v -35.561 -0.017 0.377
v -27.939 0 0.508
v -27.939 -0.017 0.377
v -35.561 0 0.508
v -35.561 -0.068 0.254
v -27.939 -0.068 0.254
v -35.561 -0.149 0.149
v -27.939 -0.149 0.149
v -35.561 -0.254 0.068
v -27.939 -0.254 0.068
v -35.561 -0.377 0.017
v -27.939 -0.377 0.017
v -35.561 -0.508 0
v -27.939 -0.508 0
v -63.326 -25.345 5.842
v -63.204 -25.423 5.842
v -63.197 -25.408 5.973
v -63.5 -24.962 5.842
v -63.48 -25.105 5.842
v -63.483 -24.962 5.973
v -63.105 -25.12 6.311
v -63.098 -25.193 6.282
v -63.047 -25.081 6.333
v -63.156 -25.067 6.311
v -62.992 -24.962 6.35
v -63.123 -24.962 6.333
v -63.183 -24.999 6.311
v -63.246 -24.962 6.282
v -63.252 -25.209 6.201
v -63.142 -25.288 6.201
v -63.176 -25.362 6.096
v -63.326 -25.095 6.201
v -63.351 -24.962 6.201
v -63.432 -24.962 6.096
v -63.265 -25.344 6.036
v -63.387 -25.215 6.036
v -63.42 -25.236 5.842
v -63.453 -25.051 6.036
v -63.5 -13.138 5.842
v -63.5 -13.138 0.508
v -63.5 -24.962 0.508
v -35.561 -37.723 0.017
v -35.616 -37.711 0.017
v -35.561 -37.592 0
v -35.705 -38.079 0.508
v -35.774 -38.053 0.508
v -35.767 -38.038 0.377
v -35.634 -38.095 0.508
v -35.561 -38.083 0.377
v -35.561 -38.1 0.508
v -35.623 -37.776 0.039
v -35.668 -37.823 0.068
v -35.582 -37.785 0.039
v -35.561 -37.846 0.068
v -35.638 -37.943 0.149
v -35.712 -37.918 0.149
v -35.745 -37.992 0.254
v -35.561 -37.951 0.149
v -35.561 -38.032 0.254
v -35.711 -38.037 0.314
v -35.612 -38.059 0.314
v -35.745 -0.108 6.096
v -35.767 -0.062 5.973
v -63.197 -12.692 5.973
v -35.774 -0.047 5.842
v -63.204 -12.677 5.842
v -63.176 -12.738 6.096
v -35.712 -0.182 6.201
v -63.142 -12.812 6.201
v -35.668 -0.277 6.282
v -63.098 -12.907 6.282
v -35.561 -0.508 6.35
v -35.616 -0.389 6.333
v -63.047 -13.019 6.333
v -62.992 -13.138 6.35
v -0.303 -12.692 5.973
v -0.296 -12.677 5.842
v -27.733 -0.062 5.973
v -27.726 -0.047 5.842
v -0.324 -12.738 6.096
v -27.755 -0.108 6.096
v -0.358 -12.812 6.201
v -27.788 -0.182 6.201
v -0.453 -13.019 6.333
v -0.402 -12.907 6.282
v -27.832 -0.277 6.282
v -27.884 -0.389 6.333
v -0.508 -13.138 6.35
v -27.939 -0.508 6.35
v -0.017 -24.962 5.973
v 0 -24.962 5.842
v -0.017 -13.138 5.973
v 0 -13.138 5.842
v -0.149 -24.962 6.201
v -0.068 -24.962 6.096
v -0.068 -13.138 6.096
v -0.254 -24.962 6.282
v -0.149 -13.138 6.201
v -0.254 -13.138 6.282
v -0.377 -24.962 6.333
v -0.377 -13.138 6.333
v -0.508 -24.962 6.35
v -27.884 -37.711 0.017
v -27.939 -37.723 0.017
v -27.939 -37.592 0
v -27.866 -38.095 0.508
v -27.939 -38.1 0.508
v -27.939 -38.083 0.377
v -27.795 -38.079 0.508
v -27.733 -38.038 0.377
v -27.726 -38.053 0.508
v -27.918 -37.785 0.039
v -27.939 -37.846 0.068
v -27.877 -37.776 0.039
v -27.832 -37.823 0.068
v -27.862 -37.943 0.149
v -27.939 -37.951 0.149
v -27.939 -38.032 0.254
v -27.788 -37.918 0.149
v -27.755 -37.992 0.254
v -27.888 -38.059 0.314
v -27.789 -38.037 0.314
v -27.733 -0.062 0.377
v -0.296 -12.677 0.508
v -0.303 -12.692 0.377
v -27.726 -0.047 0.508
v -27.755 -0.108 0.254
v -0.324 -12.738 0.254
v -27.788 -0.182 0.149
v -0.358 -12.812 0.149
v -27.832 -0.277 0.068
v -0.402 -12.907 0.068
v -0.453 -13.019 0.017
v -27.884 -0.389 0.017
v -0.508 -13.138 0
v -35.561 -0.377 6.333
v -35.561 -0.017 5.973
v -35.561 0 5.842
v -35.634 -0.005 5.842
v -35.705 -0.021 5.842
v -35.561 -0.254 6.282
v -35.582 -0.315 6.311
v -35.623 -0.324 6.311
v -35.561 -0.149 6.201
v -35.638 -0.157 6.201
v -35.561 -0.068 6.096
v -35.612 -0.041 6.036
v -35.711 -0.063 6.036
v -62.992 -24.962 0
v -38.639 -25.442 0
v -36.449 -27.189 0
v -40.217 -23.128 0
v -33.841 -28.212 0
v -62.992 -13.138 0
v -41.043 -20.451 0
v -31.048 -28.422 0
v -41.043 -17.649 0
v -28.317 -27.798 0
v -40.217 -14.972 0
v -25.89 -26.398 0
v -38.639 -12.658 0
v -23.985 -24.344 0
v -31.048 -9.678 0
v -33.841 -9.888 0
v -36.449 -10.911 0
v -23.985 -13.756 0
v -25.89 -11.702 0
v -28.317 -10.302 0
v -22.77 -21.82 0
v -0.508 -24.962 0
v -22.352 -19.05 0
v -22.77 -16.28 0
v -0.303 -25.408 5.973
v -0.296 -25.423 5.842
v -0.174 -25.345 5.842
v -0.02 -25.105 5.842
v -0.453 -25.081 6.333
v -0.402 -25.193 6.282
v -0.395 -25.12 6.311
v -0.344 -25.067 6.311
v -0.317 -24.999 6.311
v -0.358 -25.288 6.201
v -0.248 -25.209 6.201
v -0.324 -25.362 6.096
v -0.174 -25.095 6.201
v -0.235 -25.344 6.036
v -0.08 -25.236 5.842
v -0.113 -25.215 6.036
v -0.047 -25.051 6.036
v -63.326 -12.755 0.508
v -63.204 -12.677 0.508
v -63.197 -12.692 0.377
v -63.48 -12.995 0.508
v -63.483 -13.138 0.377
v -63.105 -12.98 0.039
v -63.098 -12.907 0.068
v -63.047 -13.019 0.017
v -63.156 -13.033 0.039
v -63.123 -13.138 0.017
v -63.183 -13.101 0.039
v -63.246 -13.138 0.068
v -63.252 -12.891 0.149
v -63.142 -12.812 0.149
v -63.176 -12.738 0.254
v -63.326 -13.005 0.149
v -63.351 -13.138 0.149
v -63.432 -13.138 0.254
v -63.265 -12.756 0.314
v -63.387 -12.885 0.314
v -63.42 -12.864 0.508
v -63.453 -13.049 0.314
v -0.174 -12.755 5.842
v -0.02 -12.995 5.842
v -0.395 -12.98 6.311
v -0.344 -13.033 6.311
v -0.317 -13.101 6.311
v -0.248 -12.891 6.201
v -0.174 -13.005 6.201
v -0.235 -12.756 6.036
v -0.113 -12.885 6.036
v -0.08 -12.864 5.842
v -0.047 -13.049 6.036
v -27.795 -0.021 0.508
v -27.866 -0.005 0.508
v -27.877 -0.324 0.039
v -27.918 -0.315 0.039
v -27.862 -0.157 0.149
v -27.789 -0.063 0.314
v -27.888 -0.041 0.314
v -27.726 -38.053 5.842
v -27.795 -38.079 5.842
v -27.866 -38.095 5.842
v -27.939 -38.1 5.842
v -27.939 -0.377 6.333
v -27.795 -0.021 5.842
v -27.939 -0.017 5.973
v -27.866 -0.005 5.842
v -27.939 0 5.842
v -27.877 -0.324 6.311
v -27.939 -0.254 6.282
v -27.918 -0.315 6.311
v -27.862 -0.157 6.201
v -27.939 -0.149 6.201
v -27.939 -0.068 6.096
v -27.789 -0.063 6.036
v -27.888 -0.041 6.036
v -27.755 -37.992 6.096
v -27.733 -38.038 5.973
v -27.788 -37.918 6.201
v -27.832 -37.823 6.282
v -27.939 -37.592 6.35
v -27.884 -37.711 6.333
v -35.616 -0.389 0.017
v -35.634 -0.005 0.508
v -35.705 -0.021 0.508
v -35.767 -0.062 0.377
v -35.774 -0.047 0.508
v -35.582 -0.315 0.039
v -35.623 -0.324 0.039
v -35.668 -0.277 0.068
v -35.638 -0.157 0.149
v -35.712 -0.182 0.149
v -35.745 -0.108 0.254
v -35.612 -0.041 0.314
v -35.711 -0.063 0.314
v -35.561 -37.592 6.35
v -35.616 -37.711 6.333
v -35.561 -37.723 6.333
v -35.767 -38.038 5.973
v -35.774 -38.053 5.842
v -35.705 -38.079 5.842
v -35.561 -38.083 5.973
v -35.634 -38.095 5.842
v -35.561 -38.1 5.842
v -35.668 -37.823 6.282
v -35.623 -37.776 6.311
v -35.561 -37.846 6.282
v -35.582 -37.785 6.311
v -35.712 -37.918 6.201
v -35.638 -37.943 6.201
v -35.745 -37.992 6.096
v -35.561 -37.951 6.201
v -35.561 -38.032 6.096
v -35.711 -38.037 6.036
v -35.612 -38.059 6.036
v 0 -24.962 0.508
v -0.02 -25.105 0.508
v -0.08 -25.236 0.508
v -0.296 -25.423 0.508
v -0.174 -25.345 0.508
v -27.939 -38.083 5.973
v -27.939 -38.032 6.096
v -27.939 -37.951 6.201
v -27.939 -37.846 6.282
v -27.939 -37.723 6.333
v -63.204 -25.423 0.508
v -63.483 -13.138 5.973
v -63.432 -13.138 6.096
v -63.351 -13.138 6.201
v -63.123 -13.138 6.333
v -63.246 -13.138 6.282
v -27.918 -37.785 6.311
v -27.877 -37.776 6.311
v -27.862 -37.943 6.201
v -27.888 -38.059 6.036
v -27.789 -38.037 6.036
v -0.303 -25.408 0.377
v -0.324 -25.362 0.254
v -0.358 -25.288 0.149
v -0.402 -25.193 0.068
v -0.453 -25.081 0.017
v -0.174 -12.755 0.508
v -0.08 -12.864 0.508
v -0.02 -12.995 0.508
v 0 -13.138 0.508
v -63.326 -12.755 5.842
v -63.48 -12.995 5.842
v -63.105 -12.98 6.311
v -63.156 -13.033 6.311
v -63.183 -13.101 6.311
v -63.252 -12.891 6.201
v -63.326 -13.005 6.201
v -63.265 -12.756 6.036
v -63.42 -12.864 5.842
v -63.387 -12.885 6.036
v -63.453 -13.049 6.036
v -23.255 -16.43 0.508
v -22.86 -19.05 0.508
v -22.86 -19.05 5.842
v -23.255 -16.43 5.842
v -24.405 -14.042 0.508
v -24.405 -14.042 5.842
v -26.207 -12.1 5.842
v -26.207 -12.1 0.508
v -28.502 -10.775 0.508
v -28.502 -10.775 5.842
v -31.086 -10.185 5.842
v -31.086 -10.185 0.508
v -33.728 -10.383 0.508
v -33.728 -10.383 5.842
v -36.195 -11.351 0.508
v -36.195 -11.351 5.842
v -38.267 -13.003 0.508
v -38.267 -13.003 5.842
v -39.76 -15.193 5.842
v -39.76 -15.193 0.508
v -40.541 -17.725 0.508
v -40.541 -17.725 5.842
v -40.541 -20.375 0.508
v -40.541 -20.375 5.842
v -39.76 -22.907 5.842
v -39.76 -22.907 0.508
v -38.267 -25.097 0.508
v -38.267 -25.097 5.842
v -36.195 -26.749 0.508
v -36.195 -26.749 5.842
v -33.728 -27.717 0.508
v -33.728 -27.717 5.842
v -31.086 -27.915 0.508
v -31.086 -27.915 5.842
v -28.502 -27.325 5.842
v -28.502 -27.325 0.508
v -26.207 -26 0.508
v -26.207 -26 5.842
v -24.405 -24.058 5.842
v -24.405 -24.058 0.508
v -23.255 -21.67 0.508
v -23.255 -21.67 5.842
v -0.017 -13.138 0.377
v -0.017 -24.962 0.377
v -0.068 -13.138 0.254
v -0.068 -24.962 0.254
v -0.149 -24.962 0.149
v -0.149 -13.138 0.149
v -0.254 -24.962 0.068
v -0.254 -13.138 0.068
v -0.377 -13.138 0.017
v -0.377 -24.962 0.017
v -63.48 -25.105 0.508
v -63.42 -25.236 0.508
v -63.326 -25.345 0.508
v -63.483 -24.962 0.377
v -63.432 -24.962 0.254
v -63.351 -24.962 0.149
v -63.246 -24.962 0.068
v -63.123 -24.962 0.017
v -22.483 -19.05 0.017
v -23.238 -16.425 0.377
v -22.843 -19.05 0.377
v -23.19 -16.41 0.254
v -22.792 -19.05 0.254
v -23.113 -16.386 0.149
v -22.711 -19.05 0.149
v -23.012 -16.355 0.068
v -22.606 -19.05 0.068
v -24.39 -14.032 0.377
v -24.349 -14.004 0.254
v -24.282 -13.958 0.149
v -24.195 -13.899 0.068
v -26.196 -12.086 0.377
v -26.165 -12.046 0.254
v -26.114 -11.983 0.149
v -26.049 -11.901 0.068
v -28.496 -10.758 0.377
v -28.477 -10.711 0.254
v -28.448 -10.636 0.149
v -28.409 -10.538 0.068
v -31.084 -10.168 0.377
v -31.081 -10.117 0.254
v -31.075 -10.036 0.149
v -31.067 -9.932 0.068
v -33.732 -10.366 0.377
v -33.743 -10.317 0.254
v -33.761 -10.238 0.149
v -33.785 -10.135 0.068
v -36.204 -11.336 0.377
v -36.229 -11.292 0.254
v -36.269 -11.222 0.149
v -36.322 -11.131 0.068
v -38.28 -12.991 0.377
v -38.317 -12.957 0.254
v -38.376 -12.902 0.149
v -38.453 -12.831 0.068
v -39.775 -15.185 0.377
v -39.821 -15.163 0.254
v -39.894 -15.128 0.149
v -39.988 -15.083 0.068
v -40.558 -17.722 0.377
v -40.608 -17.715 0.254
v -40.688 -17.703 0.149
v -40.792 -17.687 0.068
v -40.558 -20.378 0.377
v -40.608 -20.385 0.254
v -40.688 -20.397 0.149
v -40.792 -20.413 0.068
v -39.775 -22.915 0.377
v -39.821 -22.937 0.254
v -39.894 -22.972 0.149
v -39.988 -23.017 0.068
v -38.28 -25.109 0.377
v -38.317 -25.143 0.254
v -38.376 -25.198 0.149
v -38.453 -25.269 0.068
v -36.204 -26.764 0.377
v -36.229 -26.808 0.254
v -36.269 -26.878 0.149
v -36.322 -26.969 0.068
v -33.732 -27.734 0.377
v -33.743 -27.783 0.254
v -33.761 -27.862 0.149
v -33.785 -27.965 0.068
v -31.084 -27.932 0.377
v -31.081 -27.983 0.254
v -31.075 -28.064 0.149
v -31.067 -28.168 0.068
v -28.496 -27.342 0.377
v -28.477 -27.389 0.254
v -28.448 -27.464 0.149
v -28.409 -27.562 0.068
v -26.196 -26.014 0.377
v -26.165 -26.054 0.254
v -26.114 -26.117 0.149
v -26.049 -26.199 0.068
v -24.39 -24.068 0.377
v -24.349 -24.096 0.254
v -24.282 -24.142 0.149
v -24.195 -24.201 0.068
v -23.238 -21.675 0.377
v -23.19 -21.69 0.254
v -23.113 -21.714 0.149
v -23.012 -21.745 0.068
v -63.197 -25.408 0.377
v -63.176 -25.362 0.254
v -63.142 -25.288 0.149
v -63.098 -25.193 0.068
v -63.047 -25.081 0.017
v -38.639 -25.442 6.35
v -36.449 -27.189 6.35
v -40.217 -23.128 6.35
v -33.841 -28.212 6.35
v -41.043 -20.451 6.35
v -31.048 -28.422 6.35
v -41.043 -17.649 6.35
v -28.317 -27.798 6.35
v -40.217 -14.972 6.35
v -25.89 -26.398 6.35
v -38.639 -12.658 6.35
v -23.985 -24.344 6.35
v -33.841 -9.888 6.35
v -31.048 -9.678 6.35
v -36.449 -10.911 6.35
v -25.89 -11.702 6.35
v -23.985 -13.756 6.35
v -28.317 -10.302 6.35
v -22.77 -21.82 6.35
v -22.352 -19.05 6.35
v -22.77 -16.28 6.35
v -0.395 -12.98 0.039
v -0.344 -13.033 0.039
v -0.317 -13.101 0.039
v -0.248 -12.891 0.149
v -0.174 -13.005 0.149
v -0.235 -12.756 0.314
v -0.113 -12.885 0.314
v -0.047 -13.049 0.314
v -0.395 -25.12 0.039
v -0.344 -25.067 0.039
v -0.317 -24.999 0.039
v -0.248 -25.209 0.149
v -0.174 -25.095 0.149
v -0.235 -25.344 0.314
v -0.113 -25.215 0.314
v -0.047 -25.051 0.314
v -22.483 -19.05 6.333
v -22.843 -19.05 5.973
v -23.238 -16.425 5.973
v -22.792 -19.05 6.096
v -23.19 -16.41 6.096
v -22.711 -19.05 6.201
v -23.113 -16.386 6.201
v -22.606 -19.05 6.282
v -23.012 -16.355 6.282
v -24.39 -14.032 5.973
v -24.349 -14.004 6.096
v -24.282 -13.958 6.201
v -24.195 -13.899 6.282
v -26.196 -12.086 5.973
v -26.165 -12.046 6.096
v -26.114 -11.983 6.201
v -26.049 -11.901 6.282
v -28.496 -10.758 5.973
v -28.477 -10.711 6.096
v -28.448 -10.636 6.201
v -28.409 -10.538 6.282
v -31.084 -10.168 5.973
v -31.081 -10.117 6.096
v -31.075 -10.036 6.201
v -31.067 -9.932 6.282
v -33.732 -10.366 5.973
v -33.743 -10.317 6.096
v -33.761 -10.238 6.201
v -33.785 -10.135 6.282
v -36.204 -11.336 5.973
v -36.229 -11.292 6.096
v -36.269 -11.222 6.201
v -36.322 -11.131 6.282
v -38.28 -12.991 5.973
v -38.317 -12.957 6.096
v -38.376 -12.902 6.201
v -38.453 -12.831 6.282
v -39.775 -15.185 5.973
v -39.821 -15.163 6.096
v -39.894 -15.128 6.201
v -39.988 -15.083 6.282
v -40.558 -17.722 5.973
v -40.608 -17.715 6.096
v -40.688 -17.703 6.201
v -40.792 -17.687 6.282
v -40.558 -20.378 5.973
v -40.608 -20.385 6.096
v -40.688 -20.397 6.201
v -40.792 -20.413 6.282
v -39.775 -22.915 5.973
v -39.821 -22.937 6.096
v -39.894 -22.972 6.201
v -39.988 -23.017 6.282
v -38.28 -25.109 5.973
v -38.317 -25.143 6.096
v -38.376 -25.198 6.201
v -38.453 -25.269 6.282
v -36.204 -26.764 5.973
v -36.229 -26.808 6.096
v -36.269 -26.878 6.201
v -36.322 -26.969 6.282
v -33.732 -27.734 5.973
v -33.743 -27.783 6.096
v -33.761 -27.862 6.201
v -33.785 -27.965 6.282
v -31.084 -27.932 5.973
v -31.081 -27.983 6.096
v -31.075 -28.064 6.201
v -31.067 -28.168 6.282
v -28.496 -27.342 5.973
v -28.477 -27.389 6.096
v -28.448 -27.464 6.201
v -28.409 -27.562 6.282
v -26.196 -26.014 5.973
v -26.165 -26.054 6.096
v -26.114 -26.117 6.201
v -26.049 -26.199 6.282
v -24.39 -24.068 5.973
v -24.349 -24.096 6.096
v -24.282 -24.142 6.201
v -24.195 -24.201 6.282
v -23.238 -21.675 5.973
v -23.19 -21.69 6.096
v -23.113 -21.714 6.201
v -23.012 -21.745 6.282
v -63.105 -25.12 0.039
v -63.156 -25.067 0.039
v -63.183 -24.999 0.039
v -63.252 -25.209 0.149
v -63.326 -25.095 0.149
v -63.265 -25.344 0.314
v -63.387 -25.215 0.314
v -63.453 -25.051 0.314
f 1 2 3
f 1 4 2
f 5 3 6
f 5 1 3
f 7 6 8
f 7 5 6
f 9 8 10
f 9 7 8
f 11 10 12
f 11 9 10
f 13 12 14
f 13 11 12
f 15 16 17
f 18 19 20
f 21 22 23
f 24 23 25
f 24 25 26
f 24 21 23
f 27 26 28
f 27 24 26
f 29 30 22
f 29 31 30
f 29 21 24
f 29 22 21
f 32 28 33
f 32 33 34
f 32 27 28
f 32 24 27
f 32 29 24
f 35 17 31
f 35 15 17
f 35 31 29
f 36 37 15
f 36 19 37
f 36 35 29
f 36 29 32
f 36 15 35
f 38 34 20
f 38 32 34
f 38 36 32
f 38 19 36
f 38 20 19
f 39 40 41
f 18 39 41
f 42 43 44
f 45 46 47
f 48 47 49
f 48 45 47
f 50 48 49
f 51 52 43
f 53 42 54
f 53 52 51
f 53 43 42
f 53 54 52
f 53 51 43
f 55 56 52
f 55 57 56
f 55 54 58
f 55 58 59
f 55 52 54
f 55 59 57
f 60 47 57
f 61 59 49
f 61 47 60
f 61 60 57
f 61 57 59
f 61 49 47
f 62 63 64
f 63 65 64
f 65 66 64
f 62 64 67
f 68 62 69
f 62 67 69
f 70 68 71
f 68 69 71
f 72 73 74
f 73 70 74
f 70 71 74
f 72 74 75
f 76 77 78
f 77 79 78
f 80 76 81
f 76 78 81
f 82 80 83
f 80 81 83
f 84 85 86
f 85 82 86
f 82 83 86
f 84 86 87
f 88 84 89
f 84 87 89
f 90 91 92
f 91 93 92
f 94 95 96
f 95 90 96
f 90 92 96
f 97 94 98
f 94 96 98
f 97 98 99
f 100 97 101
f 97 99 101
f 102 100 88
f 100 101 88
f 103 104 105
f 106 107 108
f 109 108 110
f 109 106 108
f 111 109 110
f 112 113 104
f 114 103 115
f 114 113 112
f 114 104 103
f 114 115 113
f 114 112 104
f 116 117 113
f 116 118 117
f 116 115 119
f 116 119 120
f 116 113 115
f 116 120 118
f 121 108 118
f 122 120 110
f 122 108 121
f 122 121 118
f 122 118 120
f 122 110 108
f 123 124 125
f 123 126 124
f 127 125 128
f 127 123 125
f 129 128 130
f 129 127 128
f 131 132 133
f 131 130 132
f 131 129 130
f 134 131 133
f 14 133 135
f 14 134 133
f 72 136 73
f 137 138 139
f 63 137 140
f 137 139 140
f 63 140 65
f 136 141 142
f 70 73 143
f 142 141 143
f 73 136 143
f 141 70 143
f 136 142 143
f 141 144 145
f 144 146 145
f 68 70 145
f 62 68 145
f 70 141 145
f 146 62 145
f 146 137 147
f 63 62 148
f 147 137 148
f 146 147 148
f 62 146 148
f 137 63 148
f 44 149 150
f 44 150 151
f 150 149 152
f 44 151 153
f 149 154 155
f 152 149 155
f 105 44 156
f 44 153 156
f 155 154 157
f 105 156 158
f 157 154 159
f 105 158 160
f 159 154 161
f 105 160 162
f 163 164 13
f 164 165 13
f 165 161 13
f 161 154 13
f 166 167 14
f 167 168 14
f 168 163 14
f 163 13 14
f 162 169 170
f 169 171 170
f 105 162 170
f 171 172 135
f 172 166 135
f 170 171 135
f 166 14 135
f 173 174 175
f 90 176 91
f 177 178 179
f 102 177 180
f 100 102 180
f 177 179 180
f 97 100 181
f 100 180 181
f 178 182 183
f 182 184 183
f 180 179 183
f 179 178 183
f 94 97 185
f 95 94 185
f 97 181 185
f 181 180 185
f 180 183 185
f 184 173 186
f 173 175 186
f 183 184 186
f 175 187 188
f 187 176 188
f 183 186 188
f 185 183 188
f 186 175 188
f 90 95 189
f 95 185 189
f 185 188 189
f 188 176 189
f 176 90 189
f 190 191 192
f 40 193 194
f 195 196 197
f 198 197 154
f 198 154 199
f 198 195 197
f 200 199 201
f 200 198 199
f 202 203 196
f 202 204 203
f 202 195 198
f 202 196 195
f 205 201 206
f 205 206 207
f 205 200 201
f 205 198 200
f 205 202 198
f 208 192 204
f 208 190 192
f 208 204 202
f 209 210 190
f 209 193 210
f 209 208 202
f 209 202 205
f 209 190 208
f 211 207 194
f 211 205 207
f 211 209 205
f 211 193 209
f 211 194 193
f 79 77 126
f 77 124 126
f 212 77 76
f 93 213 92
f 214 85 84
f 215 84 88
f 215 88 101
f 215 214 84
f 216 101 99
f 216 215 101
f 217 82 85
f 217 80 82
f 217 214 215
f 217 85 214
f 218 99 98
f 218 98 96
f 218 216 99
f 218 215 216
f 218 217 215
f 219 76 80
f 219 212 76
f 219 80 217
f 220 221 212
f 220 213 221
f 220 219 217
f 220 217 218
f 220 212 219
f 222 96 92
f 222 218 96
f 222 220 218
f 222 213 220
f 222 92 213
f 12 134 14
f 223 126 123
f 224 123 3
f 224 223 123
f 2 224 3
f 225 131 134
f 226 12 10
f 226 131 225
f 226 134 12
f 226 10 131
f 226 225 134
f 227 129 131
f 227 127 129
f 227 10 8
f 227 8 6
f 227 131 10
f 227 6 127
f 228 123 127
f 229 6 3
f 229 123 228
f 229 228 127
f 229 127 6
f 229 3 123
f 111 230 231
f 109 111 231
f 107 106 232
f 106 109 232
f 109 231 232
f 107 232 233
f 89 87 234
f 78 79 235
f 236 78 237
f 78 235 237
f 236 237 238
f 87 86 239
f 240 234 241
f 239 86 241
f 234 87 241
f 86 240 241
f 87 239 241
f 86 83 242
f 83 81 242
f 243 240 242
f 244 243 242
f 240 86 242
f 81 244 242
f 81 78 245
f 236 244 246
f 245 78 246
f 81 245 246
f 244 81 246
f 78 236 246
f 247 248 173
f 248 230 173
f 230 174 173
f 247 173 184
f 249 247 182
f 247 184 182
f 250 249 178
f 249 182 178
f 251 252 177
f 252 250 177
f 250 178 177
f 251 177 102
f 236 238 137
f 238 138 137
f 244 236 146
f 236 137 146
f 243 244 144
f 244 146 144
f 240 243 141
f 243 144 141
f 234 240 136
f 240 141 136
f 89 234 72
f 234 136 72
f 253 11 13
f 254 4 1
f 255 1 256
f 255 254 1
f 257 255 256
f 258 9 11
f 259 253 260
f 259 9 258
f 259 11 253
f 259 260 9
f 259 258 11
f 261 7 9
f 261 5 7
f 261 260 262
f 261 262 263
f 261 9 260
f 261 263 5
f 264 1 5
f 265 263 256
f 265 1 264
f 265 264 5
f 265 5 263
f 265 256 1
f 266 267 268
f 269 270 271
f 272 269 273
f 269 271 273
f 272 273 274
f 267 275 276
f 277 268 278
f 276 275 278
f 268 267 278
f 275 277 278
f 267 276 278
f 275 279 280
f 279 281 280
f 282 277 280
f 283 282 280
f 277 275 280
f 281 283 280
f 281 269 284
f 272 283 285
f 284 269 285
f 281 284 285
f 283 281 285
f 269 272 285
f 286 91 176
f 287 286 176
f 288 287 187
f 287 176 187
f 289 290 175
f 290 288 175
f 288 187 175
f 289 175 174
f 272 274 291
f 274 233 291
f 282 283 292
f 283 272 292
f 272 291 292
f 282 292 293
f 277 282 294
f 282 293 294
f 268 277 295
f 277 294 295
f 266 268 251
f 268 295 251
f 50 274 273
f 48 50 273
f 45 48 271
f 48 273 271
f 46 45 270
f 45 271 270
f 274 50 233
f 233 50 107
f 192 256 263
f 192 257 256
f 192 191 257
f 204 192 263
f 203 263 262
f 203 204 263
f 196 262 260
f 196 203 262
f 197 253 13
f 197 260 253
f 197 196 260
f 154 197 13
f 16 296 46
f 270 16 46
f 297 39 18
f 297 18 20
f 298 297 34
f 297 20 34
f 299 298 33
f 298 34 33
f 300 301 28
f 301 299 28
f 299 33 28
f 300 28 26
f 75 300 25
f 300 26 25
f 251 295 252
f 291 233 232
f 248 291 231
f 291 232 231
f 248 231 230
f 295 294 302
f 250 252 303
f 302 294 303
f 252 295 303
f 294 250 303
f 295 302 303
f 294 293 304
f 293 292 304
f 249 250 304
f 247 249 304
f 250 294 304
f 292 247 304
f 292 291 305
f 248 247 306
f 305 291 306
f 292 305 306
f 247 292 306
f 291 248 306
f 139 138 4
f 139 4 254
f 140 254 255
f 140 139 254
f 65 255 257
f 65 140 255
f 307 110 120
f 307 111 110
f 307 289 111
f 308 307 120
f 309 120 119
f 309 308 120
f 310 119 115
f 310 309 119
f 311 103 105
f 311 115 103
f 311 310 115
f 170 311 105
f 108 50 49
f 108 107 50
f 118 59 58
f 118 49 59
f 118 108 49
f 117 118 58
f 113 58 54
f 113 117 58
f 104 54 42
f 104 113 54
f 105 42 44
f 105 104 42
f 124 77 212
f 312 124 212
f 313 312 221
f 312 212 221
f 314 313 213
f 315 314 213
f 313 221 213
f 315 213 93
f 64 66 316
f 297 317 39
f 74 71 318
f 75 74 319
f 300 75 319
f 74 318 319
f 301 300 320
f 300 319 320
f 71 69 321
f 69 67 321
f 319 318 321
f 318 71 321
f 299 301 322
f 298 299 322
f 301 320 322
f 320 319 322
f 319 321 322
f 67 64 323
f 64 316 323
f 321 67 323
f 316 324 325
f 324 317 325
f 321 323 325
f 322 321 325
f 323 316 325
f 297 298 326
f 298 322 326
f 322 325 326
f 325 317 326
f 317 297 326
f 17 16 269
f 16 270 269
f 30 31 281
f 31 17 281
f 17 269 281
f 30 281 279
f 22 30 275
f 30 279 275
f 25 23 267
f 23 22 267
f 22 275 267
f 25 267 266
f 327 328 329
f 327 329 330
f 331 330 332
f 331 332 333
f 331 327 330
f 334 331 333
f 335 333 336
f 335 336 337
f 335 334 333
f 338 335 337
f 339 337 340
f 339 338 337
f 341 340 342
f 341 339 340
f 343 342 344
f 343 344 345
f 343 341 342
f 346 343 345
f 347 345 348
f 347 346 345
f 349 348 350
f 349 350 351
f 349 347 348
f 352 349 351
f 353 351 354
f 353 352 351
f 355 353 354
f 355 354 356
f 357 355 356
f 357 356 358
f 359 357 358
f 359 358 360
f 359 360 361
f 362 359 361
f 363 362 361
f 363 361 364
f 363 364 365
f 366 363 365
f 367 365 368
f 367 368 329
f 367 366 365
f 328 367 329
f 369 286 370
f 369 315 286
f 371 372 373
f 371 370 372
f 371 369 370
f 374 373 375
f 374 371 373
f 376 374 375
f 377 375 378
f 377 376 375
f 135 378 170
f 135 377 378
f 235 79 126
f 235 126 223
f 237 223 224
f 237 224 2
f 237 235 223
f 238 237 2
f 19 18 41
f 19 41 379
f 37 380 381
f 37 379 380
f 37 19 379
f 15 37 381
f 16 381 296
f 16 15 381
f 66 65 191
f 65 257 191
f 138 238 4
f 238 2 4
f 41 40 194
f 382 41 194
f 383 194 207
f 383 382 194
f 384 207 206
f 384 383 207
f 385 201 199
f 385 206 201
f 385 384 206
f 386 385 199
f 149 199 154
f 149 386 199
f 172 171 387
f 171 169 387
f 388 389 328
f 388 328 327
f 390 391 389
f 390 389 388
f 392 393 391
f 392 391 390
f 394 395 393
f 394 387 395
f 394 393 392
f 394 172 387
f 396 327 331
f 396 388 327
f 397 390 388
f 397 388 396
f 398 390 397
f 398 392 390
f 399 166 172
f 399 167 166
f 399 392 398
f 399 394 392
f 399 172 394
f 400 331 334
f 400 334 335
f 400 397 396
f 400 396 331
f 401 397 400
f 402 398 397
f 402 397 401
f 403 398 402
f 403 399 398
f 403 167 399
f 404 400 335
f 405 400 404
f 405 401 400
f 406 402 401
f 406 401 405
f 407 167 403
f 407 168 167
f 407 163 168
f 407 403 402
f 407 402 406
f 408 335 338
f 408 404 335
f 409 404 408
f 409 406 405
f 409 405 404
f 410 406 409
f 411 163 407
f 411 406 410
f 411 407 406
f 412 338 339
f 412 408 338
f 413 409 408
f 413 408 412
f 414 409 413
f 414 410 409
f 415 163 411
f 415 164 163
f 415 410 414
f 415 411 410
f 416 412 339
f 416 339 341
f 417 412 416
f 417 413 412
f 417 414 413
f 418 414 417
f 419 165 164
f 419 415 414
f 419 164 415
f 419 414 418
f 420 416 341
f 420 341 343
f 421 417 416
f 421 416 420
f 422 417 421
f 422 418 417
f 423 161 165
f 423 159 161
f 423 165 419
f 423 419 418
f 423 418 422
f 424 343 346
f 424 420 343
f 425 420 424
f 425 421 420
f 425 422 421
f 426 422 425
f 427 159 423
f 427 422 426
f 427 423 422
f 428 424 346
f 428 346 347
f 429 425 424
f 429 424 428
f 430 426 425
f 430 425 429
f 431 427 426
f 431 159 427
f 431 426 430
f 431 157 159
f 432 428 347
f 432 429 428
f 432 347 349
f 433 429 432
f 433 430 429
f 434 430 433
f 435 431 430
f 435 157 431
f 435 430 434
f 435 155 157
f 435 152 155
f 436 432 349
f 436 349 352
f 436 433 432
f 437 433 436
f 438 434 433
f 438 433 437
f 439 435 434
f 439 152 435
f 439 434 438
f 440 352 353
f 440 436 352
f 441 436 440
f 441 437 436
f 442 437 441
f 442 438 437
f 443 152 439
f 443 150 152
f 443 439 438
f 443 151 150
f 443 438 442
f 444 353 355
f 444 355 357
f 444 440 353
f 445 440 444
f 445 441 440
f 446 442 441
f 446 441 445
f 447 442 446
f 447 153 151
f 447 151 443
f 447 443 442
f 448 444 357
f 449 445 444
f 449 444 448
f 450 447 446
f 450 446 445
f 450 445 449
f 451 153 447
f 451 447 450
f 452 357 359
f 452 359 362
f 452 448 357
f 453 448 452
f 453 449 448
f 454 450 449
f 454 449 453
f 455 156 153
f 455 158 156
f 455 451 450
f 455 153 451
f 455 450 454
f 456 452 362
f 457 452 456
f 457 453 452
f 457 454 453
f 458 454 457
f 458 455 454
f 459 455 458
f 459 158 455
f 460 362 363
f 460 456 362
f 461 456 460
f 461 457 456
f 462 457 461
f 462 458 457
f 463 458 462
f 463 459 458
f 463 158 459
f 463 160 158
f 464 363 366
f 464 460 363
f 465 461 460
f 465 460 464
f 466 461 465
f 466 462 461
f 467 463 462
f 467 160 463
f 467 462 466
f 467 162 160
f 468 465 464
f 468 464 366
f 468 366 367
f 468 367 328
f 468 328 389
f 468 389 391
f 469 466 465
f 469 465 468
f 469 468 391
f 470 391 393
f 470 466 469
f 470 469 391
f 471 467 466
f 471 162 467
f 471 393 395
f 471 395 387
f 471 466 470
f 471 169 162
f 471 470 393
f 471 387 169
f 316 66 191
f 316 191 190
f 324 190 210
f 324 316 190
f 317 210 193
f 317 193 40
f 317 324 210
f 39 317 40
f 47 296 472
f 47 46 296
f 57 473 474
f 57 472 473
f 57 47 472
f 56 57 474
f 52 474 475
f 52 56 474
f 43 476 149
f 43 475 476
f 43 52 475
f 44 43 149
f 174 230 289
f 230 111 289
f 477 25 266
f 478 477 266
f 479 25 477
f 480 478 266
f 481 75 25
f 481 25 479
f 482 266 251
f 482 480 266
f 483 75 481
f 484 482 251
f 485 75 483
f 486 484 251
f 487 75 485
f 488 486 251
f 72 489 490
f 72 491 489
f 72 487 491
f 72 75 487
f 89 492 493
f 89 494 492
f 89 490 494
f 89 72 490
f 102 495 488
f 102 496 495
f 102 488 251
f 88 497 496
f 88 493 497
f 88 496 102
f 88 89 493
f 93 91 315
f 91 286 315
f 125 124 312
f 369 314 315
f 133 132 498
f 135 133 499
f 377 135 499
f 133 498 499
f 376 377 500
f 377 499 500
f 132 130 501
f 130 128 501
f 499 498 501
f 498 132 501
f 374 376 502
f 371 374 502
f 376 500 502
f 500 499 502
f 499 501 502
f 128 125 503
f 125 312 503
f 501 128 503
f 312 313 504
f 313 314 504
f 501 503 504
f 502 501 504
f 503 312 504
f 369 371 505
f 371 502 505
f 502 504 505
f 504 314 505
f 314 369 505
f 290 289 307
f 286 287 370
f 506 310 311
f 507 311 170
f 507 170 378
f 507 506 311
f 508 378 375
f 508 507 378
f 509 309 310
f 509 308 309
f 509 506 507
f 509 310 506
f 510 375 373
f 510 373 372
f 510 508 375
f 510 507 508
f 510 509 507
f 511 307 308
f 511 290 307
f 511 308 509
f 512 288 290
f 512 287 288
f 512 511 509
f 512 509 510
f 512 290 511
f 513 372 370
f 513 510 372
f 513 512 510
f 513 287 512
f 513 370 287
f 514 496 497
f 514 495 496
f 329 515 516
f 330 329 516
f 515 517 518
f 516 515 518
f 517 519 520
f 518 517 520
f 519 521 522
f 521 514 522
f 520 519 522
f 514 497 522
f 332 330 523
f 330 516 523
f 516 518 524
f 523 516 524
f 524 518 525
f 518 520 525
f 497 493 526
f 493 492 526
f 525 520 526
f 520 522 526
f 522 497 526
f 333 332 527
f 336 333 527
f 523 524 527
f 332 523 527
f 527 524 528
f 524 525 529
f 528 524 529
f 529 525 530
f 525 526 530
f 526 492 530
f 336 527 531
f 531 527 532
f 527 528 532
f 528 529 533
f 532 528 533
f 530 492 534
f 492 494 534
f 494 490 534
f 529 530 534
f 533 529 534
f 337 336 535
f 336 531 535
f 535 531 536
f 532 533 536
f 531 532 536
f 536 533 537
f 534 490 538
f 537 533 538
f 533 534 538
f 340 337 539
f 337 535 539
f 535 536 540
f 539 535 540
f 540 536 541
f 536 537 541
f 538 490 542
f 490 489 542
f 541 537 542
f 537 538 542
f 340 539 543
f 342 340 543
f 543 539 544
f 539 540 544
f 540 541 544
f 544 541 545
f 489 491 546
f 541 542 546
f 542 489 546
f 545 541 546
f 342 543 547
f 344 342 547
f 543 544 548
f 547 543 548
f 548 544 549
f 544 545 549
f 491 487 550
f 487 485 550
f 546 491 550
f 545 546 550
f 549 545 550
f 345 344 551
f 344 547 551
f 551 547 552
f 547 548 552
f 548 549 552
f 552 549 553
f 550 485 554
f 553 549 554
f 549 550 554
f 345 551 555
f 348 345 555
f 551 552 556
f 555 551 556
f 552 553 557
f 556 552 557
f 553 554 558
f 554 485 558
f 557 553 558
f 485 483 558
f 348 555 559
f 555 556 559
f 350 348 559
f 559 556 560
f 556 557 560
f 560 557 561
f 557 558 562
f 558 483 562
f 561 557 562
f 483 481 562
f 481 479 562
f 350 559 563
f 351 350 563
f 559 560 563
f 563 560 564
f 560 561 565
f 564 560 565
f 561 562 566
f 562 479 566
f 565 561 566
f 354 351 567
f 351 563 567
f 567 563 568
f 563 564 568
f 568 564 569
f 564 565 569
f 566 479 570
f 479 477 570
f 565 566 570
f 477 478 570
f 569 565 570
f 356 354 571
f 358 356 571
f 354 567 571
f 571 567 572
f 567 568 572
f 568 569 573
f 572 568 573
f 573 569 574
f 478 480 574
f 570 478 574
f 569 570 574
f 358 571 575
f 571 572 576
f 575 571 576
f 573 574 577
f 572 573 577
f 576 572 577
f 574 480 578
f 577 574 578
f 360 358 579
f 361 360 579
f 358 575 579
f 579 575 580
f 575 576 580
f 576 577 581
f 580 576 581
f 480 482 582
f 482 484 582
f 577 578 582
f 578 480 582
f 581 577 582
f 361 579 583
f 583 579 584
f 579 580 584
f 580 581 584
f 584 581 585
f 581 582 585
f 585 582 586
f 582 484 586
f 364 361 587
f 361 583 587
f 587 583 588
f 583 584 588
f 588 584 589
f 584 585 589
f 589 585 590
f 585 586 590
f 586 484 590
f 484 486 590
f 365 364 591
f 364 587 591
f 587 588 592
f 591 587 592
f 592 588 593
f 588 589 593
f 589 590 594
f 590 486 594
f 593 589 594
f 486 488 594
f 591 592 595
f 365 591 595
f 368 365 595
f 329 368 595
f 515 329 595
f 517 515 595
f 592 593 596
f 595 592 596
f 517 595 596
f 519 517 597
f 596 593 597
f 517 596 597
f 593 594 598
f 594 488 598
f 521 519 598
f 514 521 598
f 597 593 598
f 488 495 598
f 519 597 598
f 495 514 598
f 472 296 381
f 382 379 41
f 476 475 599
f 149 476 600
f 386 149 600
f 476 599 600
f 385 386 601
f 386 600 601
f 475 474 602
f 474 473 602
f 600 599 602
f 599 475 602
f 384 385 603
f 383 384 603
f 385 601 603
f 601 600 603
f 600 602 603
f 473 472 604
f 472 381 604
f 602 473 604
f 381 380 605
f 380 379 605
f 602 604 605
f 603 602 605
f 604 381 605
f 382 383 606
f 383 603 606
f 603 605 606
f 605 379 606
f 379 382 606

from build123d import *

# Parameters (mm, degrees)
F0_R     = 8.89
F1_DEPTH = 6.35
F2_R     = 0.508


with BuildPart() as f1:
    # F0 (on Top) → F1 (new body)
    with BuildSketch(Plane.XY):
        Polygon((0, -12.812661), (-27.827339, 0), (-35.672661, 0), (-63.5, -12.812661), (-63.5, -25.287339), (-35.672661, -38.1), (-27.827339, -38.1), (0, -25.287339), align=None)
        with Locations((-31.75, -19.05)):
            Circle(F0_R, mode=Mode.SUBTRACT)
    extrude(amount=F1_DEPTH)

    # F2
    f2_edges = [f1.edges().sort_by_distance(p)[0] for p in [
        (-63.5, -25.287339, 3.175),
        (-35.672661, -38.1, 3.175),
        (-49.58633, -31.693669, 0),
        (-49.58633, -31.693669, 6.35),
        (-13.91367, -6.406331, 6.35),
        (-31.75, 0, 6.35),
        (-49.58633, -6.406331, 6.35),
        (-63.5, -19.05, 6.35),
        (-31.75, -38.1, 6.35),
        (-13.91367, -31.693669, 6.35),
        (0, -19.05, 6.35),
        (-40.64, -19.05, 6.35),
        (-13.91367, -6.406331, 0),
        (-31.75, 0, 0),
        (-49.58633, -6.406331, 0),
        (-63.5, -19.05, 0),
        (-31.75, -38.1, 0),
        (-13.91367, -31.693669, 0),
        (0, -19.05, 0),
        (-40.64, -19.05, 0),
        (-63.5, -12.812661, 3.175),
        (-35.672661, 0, 3.175),
        (-27.827339, 0, 3.175),
        (0, -12.812661, 3.175),
        (0, -25.287339, 3.175),
        (-27.827339, -38.1, 3.175),
    ]]
    fillet(f2_edges, radius=F2_R)


solid = f1.part
